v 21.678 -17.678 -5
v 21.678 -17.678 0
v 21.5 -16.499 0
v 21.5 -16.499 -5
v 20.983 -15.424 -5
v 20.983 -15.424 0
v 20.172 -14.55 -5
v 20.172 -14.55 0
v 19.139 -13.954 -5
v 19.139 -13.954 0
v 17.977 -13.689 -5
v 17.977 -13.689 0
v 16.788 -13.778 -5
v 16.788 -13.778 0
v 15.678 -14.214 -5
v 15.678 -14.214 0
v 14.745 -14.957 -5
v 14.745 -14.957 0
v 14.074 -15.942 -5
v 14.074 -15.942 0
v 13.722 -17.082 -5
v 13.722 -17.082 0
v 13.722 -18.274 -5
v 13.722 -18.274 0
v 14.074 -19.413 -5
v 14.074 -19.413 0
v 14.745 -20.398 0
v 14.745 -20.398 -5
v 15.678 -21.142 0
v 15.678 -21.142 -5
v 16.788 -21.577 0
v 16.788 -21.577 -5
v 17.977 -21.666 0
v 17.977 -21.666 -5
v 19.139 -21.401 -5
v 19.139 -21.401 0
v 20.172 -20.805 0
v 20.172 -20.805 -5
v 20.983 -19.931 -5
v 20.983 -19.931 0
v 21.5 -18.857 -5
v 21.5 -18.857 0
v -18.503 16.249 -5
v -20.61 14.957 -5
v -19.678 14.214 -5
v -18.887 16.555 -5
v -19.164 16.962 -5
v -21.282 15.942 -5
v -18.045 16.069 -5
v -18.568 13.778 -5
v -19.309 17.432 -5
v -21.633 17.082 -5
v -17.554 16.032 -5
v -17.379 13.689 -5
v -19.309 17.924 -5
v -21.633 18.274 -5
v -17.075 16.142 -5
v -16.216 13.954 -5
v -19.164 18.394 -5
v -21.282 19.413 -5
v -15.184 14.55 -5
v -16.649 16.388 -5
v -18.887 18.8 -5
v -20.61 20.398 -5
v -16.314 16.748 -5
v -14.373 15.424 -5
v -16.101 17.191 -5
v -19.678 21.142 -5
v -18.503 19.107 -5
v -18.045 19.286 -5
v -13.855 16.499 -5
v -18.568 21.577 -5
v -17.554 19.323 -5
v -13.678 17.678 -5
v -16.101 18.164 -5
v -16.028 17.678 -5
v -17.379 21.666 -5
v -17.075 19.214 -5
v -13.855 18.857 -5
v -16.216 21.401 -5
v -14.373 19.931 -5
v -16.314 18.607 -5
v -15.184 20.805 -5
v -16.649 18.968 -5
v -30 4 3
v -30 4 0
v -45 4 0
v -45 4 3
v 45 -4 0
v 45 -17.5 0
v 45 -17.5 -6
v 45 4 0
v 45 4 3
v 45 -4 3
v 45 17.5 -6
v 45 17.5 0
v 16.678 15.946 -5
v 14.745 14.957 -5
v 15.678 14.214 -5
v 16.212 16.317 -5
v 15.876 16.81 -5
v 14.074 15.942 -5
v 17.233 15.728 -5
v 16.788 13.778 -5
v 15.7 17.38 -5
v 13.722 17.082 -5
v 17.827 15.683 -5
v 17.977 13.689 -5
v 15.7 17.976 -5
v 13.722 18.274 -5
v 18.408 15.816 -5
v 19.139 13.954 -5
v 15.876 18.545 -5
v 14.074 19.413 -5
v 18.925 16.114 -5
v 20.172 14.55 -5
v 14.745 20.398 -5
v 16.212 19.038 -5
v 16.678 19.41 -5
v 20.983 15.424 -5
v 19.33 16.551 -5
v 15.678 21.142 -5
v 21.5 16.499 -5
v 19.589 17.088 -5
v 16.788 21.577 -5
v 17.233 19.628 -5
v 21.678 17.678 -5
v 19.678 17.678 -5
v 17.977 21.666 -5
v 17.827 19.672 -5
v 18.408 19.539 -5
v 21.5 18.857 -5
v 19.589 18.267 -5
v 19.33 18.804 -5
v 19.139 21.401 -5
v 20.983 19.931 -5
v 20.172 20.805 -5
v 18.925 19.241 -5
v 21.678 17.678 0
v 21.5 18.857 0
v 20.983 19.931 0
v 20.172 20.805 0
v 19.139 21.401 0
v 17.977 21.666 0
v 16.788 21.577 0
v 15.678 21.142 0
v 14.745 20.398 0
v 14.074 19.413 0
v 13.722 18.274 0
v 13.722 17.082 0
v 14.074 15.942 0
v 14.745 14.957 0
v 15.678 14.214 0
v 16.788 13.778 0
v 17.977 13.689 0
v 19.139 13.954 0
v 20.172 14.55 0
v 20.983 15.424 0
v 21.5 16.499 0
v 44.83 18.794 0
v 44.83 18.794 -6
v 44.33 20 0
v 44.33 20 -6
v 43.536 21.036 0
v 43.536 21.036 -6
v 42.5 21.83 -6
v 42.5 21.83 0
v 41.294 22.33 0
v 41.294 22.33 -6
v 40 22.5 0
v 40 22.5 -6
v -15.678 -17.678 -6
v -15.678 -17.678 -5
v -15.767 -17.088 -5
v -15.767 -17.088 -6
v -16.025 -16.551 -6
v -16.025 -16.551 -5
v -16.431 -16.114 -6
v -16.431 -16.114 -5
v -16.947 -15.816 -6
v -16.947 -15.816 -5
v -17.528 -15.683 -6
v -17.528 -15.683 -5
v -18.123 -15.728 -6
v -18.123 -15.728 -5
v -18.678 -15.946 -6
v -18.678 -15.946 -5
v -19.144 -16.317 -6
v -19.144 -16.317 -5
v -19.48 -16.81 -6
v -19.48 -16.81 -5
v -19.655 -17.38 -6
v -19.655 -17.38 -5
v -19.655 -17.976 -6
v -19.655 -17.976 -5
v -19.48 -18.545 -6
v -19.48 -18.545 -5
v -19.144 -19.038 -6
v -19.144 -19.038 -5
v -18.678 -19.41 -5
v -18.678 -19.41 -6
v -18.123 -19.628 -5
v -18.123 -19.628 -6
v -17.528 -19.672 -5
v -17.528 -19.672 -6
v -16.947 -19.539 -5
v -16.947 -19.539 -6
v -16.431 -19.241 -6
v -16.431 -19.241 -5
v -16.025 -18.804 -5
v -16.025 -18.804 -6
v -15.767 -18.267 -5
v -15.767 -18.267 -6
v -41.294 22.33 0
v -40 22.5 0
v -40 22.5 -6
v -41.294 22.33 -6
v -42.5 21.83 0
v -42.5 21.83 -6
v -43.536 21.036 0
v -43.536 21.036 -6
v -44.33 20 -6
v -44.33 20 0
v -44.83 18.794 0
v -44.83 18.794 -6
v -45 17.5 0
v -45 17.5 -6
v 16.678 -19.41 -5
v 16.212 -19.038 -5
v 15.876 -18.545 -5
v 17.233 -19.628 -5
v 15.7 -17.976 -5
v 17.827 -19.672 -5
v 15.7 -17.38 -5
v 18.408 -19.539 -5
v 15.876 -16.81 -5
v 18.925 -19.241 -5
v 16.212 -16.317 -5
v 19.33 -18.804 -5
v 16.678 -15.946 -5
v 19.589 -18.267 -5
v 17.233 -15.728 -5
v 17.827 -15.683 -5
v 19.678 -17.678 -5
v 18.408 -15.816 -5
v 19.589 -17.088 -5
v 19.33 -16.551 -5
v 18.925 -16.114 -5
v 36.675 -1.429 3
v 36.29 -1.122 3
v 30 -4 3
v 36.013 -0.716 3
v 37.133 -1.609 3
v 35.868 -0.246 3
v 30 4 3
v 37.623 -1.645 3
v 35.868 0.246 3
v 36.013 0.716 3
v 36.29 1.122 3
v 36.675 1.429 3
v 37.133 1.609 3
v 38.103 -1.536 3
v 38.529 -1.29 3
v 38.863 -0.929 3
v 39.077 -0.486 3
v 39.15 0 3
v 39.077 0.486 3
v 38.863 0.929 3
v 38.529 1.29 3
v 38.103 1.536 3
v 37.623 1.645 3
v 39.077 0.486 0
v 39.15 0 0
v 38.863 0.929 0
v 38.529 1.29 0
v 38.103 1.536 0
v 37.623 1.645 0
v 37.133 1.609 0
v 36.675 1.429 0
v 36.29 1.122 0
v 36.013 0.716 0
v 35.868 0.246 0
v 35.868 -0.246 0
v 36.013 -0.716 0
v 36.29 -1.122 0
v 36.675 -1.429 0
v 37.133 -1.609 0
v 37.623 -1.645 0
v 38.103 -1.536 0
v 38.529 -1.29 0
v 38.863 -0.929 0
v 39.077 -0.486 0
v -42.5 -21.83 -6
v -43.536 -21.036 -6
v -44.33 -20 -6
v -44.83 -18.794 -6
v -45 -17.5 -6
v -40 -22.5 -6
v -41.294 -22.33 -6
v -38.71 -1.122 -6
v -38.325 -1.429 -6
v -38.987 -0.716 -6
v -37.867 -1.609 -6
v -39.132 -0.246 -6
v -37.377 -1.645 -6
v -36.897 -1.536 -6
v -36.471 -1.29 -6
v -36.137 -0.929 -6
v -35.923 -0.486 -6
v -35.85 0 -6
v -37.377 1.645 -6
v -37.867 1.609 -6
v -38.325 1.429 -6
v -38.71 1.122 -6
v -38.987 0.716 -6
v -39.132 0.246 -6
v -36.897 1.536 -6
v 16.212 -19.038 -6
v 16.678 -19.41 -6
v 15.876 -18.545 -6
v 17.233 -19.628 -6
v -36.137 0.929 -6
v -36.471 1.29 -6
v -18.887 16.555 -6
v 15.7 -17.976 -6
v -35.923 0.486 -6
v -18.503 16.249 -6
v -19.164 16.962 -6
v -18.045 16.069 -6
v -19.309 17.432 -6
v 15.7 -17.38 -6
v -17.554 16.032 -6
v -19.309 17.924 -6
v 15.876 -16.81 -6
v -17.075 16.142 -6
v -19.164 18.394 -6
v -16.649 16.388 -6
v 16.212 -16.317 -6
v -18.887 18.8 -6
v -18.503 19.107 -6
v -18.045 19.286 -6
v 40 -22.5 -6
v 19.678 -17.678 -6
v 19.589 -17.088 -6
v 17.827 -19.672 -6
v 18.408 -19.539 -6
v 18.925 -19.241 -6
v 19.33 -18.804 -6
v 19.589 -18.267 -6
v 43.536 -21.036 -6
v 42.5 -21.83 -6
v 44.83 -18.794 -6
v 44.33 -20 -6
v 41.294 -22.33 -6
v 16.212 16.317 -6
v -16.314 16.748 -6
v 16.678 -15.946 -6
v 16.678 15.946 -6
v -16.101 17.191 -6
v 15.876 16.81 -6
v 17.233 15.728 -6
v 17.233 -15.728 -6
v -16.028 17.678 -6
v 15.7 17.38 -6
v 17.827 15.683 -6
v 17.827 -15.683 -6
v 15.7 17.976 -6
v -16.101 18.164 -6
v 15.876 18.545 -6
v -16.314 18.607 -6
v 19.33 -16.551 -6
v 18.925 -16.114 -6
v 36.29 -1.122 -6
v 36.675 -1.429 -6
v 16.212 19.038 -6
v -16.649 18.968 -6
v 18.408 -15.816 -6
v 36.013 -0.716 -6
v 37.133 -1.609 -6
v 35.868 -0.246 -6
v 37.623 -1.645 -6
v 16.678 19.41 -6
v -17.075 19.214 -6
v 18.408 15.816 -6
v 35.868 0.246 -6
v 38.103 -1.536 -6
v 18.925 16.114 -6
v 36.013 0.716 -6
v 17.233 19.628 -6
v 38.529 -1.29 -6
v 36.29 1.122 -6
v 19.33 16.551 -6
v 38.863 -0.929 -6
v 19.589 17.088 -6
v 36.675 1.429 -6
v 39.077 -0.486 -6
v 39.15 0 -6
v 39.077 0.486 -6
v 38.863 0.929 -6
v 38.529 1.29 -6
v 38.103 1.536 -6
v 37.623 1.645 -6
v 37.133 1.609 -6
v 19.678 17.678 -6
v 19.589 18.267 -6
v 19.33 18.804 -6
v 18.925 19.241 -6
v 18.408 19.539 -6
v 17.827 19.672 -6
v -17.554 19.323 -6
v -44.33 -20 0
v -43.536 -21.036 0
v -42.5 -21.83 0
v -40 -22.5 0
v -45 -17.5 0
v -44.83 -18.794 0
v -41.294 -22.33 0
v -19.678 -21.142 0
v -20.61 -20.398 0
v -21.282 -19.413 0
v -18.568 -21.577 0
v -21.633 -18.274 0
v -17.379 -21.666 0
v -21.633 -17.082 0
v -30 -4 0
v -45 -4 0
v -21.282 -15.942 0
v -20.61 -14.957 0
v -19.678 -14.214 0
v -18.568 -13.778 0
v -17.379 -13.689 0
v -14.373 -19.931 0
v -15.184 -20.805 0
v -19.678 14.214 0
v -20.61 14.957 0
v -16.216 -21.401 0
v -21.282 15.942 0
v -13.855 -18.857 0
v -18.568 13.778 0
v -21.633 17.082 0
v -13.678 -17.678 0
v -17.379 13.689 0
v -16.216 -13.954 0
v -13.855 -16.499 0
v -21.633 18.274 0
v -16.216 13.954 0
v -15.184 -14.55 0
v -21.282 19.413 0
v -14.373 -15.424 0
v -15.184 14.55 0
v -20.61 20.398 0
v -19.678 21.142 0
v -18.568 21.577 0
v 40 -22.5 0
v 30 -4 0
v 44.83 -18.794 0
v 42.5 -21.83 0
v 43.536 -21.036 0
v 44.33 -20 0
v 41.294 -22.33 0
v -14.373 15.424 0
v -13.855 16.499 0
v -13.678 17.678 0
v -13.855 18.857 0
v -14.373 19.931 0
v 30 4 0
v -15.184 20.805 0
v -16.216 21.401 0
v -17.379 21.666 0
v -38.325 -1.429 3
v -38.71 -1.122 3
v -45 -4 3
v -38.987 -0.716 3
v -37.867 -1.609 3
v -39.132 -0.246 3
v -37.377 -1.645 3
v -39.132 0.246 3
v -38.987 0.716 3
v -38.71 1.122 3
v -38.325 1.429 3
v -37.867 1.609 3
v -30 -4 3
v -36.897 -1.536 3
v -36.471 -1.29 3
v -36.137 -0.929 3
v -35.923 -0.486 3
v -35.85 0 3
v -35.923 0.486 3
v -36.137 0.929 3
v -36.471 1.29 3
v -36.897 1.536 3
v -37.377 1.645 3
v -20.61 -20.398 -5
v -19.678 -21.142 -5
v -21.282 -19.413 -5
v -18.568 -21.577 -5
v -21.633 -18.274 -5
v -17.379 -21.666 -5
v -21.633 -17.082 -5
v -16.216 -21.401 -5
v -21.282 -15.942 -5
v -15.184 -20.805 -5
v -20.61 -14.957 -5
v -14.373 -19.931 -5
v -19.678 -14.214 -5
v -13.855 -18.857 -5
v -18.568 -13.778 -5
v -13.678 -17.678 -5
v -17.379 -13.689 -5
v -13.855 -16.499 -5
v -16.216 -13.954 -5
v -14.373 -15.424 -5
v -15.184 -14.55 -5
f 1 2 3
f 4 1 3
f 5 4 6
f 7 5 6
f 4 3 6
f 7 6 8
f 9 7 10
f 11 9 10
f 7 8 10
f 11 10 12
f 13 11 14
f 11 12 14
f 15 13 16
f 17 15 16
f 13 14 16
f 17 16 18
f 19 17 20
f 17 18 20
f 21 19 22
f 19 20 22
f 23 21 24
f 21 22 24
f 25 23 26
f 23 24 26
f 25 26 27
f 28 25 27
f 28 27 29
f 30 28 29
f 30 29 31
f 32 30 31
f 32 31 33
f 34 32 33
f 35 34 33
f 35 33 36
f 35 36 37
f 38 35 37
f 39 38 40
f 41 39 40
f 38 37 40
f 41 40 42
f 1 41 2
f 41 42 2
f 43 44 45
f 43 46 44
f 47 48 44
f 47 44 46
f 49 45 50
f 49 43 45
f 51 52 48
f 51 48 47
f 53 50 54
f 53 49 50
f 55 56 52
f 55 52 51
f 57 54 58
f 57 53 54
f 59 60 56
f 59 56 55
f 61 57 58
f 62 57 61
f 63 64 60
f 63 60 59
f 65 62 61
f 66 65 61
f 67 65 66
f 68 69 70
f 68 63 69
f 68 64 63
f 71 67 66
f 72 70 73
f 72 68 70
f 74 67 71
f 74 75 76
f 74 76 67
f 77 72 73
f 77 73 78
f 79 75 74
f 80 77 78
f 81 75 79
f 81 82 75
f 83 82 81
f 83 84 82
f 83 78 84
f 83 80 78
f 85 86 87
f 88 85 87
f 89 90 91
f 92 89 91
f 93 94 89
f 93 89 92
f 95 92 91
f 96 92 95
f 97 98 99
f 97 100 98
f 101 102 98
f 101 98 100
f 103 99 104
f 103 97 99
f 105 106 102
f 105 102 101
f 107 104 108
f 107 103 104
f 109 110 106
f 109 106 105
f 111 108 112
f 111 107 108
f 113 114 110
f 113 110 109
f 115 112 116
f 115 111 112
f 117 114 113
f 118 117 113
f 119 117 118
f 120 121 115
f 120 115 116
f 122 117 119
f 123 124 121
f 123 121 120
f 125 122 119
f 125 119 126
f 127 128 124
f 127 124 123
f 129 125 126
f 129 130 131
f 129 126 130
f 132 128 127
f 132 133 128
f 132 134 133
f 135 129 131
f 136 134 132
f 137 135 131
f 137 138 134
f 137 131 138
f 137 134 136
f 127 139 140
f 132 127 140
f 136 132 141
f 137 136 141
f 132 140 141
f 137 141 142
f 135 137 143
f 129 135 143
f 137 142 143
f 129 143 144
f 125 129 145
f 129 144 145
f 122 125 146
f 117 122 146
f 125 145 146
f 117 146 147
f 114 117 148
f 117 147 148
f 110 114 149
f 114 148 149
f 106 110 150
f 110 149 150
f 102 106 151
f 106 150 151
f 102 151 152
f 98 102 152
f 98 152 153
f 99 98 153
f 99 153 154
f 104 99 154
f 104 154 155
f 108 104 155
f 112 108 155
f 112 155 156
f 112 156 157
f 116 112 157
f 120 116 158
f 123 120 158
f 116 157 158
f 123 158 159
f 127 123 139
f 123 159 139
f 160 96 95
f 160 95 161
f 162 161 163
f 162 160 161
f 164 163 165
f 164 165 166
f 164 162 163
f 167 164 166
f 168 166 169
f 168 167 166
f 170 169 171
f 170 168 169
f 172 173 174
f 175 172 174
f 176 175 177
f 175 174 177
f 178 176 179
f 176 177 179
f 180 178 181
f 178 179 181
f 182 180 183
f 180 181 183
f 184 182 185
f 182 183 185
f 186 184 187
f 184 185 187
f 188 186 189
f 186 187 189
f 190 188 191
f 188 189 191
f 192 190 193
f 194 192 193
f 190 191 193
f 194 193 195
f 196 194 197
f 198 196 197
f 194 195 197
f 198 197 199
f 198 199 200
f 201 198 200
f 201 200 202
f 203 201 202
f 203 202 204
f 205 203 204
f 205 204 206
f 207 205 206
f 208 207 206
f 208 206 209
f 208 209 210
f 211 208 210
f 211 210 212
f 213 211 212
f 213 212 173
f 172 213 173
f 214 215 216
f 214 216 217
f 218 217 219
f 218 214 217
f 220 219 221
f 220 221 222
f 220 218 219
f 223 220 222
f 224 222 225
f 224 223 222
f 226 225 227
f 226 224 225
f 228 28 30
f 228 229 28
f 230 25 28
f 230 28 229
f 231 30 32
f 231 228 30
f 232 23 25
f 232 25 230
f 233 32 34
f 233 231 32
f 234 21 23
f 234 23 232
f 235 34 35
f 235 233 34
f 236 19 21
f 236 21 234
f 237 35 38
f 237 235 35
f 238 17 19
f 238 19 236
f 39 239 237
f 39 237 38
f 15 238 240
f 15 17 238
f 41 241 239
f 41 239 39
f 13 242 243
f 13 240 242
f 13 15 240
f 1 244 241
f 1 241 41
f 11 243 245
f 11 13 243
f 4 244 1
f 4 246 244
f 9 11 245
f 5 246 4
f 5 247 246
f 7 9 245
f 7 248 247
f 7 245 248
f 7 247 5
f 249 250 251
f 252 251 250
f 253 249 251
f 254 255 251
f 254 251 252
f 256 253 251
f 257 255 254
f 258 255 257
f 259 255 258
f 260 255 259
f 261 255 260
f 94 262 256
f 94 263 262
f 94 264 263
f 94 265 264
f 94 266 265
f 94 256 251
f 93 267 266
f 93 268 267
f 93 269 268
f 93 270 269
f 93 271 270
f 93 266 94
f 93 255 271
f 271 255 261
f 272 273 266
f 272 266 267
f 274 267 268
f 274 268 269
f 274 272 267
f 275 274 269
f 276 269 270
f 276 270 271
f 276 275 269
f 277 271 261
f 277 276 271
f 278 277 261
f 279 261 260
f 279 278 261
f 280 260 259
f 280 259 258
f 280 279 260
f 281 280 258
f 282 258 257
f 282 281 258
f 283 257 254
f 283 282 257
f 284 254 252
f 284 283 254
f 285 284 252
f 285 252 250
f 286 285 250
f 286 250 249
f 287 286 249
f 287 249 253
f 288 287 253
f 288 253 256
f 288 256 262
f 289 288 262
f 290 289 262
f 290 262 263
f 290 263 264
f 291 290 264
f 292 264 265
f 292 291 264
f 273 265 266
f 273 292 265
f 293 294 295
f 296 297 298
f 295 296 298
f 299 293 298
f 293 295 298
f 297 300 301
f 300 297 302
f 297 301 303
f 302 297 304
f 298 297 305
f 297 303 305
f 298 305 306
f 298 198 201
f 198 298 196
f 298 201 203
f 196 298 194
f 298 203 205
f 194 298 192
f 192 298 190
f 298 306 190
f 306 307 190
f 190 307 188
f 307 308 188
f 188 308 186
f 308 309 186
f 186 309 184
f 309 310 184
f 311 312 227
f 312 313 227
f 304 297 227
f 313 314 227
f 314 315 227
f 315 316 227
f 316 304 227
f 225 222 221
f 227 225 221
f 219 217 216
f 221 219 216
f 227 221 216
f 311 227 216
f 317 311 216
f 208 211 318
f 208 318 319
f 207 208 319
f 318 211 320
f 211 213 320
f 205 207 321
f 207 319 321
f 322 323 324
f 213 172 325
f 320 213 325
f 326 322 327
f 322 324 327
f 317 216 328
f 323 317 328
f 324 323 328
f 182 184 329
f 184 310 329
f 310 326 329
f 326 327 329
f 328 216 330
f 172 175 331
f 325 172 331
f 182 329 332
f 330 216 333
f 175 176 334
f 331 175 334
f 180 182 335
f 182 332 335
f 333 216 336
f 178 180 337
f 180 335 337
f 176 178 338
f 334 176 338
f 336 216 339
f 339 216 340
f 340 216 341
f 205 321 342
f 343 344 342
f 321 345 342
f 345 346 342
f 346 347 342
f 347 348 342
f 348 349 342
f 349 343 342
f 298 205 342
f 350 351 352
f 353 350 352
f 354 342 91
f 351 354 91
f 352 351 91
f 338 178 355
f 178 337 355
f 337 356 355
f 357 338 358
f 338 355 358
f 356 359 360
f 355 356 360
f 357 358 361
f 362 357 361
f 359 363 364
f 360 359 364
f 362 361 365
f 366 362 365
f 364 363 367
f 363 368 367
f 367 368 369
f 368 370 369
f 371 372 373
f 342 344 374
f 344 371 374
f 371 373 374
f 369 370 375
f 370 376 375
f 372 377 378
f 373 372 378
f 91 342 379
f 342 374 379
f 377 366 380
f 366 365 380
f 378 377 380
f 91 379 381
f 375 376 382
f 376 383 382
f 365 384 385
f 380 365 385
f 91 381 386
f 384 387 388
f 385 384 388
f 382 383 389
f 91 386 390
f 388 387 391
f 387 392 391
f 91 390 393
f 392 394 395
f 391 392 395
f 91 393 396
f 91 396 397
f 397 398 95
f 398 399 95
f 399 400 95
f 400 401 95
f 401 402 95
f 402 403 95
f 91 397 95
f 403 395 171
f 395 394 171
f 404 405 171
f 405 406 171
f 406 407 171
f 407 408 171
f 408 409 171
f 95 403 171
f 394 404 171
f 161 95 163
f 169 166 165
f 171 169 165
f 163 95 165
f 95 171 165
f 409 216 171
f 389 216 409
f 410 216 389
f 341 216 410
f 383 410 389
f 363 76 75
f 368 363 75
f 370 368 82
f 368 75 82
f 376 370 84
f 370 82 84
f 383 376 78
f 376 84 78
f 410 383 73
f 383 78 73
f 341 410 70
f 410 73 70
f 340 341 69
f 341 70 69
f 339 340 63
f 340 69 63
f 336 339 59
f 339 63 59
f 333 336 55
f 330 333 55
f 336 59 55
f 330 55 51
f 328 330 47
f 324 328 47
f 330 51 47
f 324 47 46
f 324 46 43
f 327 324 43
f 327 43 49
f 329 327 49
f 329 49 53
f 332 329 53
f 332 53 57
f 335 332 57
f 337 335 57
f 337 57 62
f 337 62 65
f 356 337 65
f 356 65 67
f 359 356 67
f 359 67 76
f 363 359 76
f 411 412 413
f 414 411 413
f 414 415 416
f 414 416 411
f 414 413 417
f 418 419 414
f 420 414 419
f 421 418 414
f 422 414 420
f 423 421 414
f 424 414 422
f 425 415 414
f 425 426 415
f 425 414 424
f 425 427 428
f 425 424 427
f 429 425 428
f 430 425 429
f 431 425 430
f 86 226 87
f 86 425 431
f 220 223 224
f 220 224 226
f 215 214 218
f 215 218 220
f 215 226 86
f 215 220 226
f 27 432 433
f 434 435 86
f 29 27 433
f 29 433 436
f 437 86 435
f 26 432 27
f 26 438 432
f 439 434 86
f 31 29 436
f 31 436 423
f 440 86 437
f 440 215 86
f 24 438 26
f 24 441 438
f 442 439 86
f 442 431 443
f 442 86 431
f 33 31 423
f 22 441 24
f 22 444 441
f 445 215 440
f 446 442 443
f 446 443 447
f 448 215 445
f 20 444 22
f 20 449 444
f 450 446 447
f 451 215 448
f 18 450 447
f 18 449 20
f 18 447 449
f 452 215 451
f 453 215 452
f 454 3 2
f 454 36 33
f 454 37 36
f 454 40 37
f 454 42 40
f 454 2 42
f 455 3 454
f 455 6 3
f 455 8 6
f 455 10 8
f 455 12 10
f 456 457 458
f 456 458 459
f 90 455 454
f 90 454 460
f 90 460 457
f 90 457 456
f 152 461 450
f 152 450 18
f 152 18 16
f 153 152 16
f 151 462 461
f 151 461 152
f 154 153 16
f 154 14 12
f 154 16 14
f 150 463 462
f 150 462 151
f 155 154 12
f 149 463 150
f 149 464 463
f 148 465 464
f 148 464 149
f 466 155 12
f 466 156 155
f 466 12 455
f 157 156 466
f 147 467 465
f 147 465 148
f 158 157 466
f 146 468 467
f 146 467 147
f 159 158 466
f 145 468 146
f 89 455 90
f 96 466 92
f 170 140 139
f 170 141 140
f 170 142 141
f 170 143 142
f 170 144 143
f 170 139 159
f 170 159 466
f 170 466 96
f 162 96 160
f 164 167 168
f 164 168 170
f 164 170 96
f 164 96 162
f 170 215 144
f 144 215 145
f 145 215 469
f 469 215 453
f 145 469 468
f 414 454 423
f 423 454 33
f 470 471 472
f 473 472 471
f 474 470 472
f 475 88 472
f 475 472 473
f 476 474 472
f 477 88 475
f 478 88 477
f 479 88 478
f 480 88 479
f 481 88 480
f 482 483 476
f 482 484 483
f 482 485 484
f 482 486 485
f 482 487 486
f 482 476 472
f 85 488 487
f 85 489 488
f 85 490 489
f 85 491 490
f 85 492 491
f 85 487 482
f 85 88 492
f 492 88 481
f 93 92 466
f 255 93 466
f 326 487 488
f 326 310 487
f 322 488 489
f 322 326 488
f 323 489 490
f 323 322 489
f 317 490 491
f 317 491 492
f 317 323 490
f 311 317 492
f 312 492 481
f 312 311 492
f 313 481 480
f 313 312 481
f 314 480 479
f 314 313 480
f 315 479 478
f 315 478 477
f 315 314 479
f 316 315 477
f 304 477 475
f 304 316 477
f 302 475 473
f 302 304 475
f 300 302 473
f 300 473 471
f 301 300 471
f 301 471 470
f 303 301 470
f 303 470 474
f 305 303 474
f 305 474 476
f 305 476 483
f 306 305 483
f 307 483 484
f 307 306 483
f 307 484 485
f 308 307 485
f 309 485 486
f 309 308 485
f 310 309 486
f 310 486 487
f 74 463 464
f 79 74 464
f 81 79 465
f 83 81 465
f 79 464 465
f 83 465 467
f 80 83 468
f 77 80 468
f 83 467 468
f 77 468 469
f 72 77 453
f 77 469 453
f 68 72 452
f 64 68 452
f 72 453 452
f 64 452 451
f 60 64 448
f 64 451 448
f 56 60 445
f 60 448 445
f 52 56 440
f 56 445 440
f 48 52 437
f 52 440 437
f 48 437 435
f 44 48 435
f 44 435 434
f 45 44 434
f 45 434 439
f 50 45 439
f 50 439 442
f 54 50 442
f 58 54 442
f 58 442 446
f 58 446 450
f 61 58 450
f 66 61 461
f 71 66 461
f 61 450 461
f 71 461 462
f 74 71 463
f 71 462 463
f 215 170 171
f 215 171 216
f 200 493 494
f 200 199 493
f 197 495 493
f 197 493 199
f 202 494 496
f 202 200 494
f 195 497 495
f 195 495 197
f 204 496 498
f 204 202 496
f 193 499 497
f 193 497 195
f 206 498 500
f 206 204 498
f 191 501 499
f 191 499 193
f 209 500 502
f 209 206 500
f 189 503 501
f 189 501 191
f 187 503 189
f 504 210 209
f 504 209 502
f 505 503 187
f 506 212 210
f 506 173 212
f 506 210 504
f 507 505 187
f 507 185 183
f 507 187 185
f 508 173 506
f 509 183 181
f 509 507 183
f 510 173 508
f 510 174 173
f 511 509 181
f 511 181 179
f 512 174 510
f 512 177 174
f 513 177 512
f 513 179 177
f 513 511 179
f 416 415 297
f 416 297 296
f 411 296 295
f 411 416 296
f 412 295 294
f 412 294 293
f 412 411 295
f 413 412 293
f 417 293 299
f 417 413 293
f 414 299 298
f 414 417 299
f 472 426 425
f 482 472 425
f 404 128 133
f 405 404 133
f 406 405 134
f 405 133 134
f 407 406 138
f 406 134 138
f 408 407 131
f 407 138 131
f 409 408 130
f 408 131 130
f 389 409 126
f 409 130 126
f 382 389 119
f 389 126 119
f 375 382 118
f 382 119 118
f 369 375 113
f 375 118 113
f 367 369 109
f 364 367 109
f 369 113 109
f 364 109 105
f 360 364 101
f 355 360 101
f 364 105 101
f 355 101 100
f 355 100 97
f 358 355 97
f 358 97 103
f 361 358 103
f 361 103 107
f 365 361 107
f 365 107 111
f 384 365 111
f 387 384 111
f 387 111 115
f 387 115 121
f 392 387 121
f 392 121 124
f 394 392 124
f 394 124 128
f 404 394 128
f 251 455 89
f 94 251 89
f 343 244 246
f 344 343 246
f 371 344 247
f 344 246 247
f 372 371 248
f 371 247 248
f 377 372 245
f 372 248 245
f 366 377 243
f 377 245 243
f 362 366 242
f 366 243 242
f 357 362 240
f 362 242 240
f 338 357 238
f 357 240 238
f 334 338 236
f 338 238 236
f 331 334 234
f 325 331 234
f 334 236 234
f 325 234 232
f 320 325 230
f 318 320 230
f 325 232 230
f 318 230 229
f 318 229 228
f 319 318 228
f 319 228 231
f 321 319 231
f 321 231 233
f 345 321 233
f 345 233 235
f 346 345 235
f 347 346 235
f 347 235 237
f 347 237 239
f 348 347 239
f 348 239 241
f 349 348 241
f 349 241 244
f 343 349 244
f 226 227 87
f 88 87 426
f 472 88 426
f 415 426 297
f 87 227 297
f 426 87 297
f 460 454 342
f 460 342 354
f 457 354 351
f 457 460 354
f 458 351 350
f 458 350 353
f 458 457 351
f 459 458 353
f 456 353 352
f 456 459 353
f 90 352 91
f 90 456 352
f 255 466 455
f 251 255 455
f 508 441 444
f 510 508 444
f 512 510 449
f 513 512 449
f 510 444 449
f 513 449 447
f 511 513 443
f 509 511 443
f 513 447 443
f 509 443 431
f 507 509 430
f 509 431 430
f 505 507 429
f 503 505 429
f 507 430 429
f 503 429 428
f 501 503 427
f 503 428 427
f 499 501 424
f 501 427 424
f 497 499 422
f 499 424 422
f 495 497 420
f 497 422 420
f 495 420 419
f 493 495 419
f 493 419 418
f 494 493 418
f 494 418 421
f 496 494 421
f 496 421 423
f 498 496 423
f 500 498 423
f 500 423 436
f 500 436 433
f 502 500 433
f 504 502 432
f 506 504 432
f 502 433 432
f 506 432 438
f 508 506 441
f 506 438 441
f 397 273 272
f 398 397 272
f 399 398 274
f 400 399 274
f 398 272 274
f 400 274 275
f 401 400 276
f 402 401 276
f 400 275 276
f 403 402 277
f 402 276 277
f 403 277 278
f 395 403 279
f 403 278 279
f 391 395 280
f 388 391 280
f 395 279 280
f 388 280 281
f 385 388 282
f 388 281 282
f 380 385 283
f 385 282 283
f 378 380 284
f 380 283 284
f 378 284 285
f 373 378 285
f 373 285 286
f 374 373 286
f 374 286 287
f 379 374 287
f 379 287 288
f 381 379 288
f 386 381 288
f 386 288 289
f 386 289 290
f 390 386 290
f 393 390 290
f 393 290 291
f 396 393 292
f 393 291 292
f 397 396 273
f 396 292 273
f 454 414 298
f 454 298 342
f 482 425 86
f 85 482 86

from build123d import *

# Parameters (mm, degrees)
F0_R     = 4
F0_R_2   = 1.65
F0_R_3   = 2
F1_DEPTH = 6
F2_DEPTH = 5
F3_DEPTH = 3


# Not quite as in the source:
# - a feature names something its author has since deleted; it is built from what else it names


with BuildPart() as f1:
    # F0 (on Top) → F1 (new body)
    with BuildSketch(Plane.XY):
        with BuildLine():
            Line((40, 22.5), (-40, 22.5))
            ThreePointArc((-40, 22.5), (-43.5355339059, 21.0355339059), (-45, 17.5))
            Line((-45, 17.5), (-45, 4))
            Line((-45, 4), (-30, 4))
            Line((-30, 4), (-30, 0))
            Line((-30, 0), (-30, -4))
            Line((-30, -4), (-45, -4))
            Line((-45, -4), (-45, -17.5))
            ThreePointArc((-45, -17.5), (-43.5355339059, -21.0355339059), (-40, -22.5))
            Line((-40, -22.5), (40, -22.5))
            ThreePointArc((40, -22.5), (43.5355339059, -21.0355339059), (45, -17.5))
            Line((45, -17.5), (45, -4))
            Line((45, -4), (30, -4))
            Line((30, -4), (30, 0))
            Line((30, 0), (30, 4))
            Line((30, 4), (45, 4))
            Line((45, 4), (45, 17.5))
            ThreePointArc((45, 17.5), (43.5355339059, 21.0355339059), (40, 22.5))
        make_face()
        with Locations((-17.6776695297, -17.6776695297)):
            Circle(F0_R, mode=Mode.SUBTRACT)
        with Locations((17.6776695297, -17.6776695297)):
            Circle(F0_R, mode=Mode.SUBTRACT)
        with Locations((-17.6776695297, 17.6776695297)):
            Circle(F0_R, mode=Mode.SUBTRACT)
        with Locations((17.6776695297, 17.6776695297)):
            Circle(F0_R, mode=Mode.SUBTRACT)
        Polygon((-30, 4), (-45, 4), (-45, -4), (-30, -4), (-30, 0), align=None)
        with Locations((-37.5, 0)):
            Circle(F0_R_2, mode=Mode.SUBTRACT)
        Polygon((45, -4), (45, 4), (30, 4), (30, 0), (30, -4), align=None)
        with Locations((37.5, 0)):
            Circle(F0_R_2, mode=Mode.SUBTRACT)
        with Locations((-17.6776695297, 17.6776695297)):
            Circle(F0_R)
        with Locations((-17.6776695297, 17.6776695297)):
            Circle(F0_R_2, mode=Mode.SUBTRACT)
        with Locations((-17.6776695297, -17.6776695297)):
            Circle(F0_R)
        with Locations((-17.6776695297, -17.6776695297)):
            Circle(F0_R_3, mode=Mode.SUBTRACT)
        with Locations((17.6776695297, 17.6776695297)):
            Circle(F0_R)
        with Locations((17.6776695297, 17.6776695297)):
            Circle(F0_R_3, mode=Mode.SUBTRACT)
        with Locations((17.6776695297, -17.6776695297)):
            Circle(F0_R)
        with Locations((17.6776695297, -17.6776695297)):
            Circle(F0_R_3, mode=Mode.SUBTRACT)
    extrude(amount=-F1_DEPTH)

    # F0 (on Top) → F2 (cut)
    with BuildSketch(Plane.XY):
        with Locations((-17.6776695297, 17.6776695297)):
            Circle(F0_R)
        with Locations((-17.6776695297, 17.6776695297)):
            Circle(F0_R_2, mode=Mode.SUBTRACT)
        with Locations((-17.6776695297, 17.6776695297)):
            Circle(F0_R_2)
        with Locations((-17.6776695297, -17.6776695297)):
            Circle(F0_R)
        with Locations((-17.6776695297, -17.6776695297)):
            Circle(F0_R_3, mode=Mode.SUBTRACT)
        with Locations((17.6776695297, -17.6776695297)):
            Circle(F0_R)
        with Locations((17.6776695297, -17.6776695297)):
            Circle(F0_R_3, mode=Mode.SUBTRACT)
        with Locations((17.6776695297, 17.6776695297)):
            Circle(F0_R)
        with Locations((17.6776695297, 17.6776695297)):
            Circle(F0_R_3, mode=Mode.SUBTRACT)
    extrude(amount=-F2_DEPTH, mode=Mode.SUBTRACT)

    # F0 (on Top) → F3 (join)
    with BuildSketch(Plane.XY):
        Polygon((-30, 4), (-45, 4), (-45, -4), (-30, -4), (-30, 0), align=None)
        with Locations((-37.5, 0)):
            Circle(F0_R_2, mode=Mode.SUBTRACT)
        Polygon((45, -4), (45, 4), (30, 4), (30, 0), (30, -4), align=None)
        with Locations((37.5, 0)):
            Circle(F0_R_2, mode=Mode.SUBTRACT)
    extrude(amount=F3_DEPTH)


solid = f1.part
